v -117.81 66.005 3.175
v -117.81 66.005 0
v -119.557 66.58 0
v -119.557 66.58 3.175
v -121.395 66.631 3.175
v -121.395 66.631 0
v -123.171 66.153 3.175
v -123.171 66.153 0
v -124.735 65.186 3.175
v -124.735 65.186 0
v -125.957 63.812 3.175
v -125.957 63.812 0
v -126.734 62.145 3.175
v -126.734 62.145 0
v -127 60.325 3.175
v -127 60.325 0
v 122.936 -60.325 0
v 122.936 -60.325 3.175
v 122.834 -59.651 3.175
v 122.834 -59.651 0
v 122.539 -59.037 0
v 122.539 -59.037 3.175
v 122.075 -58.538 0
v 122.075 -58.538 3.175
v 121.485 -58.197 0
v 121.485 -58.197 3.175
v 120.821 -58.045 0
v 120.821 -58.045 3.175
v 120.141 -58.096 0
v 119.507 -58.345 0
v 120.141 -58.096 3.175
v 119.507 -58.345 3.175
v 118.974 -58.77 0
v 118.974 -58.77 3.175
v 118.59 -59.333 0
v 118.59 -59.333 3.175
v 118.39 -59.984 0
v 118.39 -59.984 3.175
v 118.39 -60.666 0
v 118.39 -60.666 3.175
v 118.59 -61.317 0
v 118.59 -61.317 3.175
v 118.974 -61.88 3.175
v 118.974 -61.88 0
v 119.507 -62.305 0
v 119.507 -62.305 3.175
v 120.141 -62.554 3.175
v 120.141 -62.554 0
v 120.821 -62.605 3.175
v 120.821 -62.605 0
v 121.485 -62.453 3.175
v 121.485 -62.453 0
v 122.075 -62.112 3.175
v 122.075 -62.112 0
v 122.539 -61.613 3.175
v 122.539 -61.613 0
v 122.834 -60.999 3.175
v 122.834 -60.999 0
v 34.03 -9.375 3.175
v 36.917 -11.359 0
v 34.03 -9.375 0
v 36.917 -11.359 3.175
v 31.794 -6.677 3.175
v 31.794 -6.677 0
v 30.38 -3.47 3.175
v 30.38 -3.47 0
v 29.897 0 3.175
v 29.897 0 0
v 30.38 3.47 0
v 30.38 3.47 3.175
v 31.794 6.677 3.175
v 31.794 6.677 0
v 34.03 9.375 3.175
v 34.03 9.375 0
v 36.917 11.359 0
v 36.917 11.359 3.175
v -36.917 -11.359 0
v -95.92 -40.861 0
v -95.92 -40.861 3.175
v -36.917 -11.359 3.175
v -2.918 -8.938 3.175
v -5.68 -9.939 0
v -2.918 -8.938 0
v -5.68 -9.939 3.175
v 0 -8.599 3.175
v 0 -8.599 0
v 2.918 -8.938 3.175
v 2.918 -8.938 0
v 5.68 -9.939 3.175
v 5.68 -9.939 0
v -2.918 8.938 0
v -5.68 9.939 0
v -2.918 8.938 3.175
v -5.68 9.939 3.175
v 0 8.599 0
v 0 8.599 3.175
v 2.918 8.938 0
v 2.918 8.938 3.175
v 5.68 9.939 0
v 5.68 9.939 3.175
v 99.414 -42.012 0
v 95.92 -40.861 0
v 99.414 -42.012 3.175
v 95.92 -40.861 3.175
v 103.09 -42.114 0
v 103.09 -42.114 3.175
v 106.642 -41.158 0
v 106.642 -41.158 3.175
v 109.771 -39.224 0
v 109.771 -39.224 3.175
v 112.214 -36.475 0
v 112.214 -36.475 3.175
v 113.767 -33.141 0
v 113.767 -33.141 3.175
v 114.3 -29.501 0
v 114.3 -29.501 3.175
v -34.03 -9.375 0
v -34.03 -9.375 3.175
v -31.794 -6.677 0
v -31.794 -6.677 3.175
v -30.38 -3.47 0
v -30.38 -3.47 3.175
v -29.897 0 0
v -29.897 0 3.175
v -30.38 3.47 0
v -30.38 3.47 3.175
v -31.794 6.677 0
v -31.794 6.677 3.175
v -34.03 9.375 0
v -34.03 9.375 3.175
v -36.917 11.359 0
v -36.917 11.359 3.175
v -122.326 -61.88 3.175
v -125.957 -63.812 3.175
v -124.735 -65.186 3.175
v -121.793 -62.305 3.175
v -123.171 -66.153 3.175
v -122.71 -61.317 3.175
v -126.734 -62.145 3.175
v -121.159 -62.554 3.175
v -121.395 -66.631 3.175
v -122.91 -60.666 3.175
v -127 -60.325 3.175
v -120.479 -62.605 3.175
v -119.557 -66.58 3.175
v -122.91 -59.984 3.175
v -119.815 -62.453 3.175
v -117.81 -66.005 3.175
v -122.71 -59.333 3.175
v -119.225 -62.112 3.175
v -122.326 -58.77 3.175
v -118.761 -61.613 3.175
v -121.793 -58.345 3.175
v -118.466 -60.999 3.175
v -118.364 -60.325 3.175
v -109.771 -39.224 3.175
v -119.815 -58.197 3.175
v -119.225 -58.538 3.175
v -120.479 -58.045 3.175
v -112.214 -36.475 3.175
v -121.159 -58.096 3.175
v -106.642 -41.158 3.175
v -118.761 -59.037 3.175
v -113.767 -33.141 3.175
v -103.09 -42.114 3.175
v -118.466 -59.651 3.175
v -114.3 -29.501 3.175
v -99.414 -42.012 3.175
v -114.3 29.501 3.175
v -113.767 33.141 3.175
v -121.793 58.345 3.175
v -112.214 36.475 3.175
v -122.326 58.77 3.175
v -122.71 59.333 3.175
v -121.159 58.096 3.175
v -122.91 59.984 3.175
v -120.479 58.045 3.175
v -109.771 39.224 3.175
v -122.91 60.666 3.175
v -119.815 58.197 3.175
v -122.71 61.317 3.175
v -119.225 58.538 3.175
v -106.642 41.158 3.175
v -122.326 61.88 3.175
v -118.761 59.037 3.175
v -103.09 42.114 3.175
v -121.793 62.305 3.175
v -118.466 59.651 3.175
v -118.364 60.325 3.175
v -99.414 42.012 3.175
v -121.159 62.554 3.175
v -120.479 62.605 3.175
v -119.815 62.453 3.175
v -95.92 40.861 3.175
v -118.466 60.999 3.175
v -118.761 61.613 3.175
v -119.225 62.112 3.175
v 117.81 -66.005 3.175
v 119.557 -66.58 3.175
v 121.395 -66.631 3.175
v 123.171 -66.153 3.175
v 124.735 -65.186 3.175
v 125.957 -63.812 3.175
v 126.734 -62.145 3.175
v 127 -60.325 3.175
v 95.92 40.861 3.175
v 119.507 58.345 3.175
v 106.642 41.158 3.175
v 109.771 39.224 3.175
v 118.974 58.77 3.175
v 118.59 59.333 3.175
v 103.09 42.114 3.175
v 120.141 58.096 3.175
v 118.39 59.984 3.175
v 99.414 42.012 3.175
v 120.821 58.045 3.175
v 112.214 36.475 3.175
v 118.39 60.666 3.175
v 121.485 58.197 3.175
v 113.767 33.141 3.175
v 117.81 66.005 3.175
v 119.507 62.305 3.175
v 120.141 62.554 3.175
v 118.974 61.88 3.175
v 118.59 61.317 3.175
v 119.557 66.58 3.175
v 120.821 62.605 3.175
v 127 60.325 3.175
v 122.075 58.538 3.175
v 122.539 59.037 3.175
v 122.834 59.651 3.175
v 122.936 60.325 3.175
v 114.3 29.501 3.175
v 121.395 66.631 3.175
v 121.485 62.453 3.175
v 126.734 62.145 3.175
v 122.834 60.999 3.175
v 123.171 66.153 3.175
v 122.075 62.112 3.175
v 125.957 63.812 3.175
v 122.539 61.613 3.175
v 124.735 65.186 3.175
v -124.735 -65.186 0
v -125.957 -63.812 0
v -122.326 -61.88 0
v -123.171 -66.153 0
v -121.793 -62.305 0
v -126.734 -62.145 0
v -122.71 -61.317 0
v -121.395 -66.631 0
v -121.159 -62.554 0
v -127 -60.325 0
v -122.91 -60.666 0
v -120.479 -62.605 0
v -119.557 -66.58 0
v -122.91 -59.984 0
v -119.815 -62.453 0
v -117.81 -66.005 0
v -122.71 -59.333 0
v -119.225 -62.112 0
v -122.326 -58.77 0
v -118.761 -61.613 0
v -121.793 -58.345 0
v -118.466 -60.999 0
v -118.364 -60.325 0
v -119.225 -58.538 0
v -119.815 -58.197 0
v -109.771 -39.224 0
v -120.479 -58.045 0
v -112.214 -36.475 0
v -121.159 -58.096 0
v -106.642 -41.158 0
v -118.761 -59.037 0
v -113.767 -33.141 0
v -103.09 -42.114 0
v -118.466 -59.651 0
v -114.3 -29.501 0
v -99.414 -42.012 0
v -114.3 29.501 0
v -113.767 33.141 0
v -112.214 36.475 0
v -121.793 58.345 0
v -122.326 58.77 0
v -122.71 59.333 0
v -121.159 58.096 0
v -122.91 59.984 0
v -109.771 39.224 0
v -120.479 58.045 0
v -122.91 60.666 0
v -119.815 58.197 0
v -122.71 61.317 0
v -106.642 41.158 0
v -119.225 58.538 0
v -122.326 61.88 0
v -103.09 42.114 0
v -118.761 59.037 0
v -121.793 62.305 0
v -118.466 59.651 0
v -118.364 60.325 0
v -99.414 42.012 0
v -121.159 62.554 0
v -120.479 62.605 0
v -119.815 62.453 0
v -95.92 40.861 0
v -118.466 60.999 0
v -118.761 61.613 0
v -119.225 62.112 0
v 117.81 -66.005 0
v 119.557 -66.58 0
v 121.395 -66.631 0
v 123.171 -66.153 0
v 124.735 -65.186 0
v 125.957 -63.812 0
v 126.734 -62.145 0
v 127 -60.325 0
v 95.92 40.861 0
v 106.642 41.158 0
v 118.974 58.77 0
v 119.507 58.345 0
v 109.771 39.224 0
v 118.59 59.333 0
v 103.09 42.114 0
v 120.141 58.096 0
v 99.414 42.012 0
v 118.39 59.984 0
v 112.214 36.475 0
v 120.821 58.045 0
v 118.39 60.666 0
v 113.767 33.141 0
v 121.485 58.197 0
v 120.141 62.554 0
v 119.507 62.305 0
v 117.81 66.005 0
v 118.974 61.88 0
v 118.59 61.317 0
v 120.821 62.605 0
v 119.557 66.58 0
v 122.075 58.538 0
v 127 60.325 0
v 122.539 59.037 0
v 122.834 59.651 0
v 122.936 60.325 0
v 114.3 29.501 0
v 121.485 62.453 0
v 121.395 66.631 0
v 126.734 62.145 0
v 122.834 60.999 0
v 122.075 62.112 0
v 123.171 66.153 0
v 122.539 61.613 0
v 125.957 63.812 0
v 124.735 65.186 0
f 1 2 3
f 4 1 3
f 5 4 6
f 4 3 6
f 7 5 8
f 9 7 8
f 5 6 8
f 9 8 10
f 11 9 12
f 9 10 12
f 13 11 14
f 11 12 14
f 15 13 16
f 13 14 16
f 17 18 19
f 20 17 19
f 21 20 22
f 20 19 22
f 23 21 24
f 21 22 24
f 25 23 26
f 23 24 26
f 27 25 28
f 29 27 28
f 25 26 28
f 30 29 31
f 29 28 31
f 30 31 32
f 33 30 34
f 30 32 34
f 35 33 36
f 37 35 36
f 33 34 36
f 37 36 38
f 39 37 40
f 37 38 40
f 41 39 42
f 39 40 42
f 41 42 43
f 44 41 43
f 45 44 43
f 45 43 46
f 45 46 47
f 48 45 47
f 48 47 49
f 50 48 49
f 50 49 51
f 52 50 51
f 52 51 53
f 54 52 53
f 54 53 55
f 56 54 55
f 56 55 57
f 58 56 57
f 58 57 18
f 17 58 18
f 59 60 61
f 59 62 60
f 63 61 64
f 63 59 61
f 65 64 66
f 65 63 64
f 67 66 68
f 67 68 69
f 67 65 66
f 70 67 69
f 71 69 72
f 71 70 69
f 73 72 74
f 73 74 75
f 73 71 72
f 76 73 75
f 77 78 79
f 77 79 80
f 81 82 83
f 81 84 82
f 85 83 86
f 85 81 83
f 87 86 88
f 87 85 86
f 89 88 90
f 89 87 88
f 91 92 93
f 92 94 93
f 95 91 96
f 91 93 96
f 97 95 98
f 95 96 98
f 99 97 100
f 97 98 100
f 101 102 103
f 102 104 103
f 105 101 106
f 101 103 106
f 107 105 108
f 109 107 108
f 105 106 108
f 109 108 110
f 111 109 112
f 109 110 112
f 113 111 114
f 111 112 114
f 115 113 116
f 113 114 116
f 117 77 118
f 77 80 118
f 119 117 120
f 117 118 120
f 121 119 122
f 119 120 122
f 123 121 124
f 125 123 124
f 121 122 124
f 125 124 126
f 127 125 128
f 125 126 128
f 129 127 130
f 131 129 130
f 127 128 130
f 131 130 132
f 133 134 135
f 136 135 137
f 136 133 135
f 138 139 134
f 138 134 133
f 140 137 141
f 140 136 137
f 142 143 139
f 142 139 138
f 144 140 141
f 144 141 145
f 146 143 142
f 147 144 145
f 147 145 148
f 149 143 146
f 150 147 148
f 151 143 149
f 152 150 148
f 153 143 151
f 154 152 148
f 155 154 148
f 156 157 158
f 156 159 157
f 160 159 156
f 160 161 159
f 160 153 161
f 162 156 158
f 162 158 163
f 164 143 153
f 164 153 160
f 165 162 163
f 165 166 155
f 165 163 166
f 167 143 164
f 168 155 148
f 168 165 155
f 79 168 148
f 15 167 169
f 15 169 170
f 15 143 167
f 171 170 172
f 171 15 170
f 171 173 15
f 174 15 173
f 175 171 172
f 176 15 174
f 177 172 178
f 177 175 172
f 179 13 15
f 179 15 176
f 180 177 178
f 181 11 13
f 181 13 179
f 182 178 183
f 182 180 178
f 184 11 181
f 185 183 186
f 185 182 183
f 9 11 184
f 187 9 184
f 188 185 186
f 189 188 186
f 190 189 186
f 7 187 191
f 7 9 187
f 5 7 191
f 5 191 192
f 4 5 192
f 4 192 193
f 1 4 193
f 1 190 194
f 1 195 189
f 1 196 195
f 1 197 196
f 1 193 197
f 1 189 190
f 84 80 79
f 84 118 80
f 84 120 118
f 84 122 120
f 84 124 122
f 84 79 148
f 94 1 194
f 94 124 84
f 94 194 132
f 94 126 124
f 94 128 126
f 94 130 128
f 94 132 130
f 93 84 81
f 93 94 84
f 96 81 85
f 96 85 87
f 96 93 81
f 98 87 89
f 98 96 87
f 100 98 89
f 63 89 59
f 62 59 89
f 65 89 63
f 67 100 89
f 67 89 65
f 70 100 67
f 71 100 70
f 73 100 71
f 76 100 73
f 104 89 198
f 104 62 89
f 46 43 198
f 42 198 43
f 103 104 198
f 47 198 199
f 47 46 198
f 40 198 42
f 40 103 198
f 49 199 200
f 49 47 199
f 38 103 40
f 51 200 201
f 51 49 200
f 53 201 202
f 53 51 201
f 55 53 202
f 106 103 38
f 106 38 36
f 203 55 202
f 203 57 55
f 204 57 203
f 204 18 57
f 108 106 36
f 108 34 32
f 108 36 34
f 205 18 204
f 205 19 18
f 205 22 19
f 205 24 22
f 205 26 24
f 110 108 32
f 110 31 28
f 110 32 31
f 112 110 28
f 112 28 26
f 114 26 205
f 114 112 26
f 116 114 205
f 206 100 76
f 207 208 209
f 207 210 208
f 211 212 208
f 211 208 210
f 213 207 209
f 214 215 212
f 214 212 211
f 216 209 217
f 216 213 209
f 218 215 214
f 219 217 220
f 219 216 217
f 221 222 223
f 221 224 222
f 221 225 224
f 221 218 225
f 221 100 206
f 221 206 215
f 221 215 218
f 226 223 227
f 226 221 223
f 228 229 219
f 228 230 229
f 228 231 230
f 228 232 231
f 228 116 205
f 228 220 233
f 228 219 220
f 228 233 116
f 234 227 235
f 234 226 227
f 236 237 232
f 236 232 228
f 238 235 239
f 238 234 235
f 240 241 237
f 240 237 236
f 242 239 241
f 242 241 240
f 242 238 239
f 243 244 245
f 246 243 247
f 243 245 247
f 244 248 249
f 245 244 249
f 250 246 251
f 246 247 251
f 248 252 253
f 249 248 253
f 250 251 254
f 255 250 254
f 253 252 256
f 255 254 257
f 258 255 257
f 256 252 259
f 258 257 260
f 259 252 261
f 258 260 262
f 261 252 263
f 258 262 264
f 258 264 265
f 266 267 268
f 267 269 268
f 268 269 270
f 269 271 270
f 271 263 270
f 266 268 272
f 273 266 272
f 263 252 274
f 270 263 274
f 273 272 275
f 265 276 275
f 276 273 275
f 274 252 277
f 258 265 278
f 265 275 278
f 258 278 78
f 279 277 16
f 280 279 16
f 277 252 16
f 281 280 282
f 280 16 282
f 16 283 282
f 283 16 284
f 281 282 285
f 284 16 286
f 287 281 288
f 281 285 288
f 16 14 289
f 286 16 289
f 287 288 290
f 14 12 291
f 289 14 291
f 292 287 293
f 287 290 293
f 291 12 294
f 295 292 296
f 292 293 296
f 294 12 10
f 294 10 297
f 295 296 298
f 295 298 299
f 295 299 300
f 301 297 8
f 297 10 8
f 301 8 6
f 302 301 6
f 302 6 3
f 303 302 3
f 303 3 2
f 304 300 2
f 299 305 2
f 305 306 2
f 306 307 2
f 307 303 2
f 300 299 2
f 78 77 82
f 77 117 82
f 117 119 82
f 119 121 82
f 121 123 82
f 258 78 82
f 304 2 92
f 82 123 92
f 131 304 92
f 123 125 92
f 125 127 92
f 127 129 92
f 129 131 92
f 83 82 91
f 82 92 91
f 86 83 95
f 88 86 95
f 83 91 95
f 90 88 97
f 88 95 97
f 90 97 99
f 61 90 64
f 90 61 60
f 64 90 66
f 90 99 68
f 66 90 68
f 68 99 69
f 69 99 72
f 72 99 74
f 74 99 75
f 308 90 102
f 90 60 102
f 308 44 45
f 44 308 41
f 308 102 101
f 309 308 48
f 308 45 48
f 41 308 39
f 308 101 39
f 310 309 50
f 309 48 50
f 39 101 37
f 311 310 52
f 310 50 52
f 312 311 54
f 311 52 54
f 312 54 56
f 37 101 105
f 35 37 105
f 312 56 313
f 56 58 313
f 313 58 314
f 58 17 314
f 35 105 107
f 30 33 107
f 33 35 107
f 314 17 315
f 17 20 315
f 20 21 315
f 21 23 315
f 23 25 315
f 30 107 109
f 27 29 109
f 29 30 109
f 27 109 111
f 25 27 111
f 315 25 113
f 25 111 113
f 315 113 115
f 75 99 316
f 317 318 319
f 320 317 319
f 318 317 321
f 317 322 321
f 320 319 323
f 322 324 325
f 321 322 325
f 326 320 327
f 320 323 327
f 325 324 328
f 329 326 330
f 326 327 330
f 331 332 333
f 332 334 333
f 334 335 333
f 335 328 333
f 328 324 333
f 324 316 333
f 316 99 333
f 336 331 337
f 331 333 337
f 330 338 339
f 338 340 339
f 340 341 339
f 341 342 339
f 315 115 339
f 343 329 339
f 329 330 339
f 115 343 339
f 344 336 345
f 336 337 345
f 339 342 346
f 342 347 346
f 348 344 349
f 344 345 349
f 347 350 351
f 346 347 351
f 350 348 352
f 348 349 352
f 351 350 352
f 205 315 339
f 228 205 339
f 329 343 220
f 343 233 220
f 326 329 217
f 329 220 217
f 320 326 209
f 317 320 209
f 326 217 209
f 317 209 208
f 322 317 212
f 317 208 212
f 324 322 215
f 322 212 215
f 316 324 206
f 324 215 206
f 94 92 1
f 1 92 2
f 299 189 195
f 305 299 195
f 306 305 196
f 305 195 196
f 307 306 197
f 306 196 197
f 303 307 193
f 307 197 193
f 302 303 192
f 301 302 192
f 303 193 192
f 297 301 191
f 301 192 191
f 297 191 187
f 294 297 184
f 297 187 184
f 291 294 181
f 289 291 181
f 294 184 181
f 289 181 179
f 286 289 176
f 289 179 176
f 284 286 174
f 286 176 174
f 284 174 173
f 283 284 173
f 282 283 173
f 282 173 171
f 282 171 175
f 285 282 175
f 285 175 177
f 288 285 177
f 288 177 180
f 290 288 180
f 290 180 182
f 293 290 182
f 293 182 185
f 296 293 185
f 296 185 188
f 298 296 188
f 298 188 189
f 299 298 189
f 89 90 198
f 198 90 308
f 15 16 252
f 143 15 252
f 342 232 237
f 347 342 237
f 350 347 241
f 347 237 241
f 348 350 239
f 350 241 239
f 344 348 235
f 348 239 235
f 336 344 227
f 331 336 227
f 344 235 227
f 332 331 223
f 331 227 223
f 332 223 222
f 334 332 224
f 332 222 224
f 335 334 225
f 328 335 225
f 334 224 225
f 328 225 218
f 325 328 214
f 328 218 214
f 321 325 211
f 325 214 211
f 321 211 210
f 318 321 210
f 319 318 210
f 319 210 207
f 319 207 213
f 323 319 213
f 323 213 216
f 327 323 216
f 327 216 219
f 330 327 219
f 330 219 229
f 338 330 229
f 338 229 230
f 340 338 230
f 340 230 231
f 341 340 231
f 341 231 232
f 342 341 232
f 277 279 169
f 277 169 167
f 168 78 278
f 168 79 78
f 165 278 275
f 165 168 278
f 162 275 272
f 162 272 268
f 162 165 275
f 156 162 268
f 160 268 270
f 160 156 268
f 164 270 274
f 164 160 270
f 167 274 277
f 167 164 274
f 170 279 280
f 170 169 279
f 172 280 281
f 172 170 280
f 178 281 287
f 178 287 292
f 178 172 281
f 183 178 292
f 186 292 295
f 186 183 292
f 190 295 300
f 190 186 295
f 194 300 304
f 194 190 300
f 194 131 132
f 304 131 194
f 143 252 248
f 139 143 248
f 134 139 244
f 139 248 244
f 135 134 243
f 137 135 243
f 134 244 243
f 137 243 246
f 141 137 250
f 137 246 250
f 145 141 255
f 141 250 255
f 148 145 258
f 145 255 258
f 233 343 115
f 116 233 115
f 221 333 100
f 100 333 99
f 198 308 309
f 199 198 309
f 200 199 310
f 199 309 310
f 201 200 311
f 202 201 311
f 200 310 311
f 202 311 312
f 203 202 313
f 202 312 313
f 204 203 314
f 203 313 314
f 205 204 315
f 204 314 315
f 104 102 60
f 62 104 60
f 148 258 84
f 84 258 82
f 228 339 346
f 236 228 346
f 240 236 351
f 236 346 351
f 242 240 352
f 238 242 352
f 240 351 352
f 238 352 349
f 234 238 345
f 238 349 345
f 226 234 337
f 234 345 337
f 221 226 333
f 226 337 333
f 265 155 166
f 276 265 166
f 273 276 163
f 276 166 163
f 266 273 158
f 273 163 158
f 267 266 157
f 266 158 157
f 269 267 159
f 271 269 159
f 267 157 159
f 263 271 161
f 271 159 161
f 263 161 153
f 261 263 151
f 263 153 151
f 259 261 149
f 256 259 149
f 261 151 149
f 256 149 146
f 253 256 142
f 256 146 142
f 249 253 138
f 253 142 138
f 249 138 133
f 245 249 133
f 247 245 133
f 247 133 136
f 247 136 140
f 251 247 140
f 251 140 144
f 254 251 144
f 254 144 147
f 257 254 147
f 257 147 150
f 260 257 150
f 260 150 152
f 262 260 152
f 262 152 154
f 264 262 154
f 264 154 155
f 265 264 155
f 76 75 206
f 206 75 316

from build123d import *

# Parameters (mm, degrees)
BOSS_EXTRUDE1_DEPTH = 3.175
SKETCH2_R           = 2.286
CUT_EXTRUDE1_DEPTH  = 144.473468802
FILLET1_R           = 12.7


with BuildPart() as part:
    # Sketch1 → Boss-Extrude1 (new body)
    with BuildSketch(Plane.XY):
        with BuildLine():
            Line((-117.810193669, -66.004612663), (0, -7.099515829))
            Line((0, -7.099515829), (117.810193669, -66.004612663))
            ThreePointArc((117.810193669, -66.004612663), (123.988392562, -65.726632633), (127, -60.325))
            Line((127, -60.325), (127, 60.325))
            ThreePointArc((127, 60.325), (123.988392562, 65.726632633), (117.810193669, 66.004612663))
            Line((117.810193669, 66.004612663), (0, 7.099515829))
            Line((0, 7.099515829), (-117.810193669, 66.004612663))
            ThreePointArc((-117.810193669, 66.004612663), (-123.988392562, 65.726632633), (-127, 60.325))
            Line((-127, 60.325), (-127, -60.325))
            ThreePointArc((-127, -60.325), (-123.988392562, -65.726632633), (-117.810193669, -66.004612663))
        make_face()
        Polygon((-114.3, -50.050484171), (-14.199031657, 0), (-114.3, 50.050484171), align=None, mode=Mode.SUBTRACT)
        Polygon((14.199031657, 0), (114.3, 50.050484171), (114.3, -50.050484171), align=None, mode=Mode.SUBTRACT)
    extrude(amount=BOSS_EXTRUDE1_DEPTH)

    # Sketch2 → Cut-Extrude1 (cut, through all)
    with BuildSketch(Plane.XY.offset(3.175)):
        with Locations((-120.65, 60.325)):
            Circle(SKETCH2_R)
        with Locations((-120.65, -60.325)):
            Circle(SKETCH2_R)
        with Locations((120.65, -60.325)):
            Circle(SKETCH2_R)
        with Locations((120.65, 60.325)):
            Circle(SKETCH2_R)
    extrude(amount=-CUT_EXTRUDE1_DEPTH, mode=Mode.SUBTRACT)

    # Fillet1
    fillet1_edges = [part.edges().sort_by_distance(p)[0] for p in [
        (0, -7.099515829, 1.5875),
        (0, 7.099515829, 1.5875),
        (114.3, -50.050484171, 1.5875),
        (114.3, 50.050484171, 1.5875),
        (14.199031657, 0, 1.5875),
        (-14.199031657, 0, 1.5875),
        (-114.3, 50.050484171, 1.5875),
        (-114.3, -50.050484171, 1.5875),
    ]]
    fillet(fillet1_edges, radius=FILLET1_R)


solid = part.part
